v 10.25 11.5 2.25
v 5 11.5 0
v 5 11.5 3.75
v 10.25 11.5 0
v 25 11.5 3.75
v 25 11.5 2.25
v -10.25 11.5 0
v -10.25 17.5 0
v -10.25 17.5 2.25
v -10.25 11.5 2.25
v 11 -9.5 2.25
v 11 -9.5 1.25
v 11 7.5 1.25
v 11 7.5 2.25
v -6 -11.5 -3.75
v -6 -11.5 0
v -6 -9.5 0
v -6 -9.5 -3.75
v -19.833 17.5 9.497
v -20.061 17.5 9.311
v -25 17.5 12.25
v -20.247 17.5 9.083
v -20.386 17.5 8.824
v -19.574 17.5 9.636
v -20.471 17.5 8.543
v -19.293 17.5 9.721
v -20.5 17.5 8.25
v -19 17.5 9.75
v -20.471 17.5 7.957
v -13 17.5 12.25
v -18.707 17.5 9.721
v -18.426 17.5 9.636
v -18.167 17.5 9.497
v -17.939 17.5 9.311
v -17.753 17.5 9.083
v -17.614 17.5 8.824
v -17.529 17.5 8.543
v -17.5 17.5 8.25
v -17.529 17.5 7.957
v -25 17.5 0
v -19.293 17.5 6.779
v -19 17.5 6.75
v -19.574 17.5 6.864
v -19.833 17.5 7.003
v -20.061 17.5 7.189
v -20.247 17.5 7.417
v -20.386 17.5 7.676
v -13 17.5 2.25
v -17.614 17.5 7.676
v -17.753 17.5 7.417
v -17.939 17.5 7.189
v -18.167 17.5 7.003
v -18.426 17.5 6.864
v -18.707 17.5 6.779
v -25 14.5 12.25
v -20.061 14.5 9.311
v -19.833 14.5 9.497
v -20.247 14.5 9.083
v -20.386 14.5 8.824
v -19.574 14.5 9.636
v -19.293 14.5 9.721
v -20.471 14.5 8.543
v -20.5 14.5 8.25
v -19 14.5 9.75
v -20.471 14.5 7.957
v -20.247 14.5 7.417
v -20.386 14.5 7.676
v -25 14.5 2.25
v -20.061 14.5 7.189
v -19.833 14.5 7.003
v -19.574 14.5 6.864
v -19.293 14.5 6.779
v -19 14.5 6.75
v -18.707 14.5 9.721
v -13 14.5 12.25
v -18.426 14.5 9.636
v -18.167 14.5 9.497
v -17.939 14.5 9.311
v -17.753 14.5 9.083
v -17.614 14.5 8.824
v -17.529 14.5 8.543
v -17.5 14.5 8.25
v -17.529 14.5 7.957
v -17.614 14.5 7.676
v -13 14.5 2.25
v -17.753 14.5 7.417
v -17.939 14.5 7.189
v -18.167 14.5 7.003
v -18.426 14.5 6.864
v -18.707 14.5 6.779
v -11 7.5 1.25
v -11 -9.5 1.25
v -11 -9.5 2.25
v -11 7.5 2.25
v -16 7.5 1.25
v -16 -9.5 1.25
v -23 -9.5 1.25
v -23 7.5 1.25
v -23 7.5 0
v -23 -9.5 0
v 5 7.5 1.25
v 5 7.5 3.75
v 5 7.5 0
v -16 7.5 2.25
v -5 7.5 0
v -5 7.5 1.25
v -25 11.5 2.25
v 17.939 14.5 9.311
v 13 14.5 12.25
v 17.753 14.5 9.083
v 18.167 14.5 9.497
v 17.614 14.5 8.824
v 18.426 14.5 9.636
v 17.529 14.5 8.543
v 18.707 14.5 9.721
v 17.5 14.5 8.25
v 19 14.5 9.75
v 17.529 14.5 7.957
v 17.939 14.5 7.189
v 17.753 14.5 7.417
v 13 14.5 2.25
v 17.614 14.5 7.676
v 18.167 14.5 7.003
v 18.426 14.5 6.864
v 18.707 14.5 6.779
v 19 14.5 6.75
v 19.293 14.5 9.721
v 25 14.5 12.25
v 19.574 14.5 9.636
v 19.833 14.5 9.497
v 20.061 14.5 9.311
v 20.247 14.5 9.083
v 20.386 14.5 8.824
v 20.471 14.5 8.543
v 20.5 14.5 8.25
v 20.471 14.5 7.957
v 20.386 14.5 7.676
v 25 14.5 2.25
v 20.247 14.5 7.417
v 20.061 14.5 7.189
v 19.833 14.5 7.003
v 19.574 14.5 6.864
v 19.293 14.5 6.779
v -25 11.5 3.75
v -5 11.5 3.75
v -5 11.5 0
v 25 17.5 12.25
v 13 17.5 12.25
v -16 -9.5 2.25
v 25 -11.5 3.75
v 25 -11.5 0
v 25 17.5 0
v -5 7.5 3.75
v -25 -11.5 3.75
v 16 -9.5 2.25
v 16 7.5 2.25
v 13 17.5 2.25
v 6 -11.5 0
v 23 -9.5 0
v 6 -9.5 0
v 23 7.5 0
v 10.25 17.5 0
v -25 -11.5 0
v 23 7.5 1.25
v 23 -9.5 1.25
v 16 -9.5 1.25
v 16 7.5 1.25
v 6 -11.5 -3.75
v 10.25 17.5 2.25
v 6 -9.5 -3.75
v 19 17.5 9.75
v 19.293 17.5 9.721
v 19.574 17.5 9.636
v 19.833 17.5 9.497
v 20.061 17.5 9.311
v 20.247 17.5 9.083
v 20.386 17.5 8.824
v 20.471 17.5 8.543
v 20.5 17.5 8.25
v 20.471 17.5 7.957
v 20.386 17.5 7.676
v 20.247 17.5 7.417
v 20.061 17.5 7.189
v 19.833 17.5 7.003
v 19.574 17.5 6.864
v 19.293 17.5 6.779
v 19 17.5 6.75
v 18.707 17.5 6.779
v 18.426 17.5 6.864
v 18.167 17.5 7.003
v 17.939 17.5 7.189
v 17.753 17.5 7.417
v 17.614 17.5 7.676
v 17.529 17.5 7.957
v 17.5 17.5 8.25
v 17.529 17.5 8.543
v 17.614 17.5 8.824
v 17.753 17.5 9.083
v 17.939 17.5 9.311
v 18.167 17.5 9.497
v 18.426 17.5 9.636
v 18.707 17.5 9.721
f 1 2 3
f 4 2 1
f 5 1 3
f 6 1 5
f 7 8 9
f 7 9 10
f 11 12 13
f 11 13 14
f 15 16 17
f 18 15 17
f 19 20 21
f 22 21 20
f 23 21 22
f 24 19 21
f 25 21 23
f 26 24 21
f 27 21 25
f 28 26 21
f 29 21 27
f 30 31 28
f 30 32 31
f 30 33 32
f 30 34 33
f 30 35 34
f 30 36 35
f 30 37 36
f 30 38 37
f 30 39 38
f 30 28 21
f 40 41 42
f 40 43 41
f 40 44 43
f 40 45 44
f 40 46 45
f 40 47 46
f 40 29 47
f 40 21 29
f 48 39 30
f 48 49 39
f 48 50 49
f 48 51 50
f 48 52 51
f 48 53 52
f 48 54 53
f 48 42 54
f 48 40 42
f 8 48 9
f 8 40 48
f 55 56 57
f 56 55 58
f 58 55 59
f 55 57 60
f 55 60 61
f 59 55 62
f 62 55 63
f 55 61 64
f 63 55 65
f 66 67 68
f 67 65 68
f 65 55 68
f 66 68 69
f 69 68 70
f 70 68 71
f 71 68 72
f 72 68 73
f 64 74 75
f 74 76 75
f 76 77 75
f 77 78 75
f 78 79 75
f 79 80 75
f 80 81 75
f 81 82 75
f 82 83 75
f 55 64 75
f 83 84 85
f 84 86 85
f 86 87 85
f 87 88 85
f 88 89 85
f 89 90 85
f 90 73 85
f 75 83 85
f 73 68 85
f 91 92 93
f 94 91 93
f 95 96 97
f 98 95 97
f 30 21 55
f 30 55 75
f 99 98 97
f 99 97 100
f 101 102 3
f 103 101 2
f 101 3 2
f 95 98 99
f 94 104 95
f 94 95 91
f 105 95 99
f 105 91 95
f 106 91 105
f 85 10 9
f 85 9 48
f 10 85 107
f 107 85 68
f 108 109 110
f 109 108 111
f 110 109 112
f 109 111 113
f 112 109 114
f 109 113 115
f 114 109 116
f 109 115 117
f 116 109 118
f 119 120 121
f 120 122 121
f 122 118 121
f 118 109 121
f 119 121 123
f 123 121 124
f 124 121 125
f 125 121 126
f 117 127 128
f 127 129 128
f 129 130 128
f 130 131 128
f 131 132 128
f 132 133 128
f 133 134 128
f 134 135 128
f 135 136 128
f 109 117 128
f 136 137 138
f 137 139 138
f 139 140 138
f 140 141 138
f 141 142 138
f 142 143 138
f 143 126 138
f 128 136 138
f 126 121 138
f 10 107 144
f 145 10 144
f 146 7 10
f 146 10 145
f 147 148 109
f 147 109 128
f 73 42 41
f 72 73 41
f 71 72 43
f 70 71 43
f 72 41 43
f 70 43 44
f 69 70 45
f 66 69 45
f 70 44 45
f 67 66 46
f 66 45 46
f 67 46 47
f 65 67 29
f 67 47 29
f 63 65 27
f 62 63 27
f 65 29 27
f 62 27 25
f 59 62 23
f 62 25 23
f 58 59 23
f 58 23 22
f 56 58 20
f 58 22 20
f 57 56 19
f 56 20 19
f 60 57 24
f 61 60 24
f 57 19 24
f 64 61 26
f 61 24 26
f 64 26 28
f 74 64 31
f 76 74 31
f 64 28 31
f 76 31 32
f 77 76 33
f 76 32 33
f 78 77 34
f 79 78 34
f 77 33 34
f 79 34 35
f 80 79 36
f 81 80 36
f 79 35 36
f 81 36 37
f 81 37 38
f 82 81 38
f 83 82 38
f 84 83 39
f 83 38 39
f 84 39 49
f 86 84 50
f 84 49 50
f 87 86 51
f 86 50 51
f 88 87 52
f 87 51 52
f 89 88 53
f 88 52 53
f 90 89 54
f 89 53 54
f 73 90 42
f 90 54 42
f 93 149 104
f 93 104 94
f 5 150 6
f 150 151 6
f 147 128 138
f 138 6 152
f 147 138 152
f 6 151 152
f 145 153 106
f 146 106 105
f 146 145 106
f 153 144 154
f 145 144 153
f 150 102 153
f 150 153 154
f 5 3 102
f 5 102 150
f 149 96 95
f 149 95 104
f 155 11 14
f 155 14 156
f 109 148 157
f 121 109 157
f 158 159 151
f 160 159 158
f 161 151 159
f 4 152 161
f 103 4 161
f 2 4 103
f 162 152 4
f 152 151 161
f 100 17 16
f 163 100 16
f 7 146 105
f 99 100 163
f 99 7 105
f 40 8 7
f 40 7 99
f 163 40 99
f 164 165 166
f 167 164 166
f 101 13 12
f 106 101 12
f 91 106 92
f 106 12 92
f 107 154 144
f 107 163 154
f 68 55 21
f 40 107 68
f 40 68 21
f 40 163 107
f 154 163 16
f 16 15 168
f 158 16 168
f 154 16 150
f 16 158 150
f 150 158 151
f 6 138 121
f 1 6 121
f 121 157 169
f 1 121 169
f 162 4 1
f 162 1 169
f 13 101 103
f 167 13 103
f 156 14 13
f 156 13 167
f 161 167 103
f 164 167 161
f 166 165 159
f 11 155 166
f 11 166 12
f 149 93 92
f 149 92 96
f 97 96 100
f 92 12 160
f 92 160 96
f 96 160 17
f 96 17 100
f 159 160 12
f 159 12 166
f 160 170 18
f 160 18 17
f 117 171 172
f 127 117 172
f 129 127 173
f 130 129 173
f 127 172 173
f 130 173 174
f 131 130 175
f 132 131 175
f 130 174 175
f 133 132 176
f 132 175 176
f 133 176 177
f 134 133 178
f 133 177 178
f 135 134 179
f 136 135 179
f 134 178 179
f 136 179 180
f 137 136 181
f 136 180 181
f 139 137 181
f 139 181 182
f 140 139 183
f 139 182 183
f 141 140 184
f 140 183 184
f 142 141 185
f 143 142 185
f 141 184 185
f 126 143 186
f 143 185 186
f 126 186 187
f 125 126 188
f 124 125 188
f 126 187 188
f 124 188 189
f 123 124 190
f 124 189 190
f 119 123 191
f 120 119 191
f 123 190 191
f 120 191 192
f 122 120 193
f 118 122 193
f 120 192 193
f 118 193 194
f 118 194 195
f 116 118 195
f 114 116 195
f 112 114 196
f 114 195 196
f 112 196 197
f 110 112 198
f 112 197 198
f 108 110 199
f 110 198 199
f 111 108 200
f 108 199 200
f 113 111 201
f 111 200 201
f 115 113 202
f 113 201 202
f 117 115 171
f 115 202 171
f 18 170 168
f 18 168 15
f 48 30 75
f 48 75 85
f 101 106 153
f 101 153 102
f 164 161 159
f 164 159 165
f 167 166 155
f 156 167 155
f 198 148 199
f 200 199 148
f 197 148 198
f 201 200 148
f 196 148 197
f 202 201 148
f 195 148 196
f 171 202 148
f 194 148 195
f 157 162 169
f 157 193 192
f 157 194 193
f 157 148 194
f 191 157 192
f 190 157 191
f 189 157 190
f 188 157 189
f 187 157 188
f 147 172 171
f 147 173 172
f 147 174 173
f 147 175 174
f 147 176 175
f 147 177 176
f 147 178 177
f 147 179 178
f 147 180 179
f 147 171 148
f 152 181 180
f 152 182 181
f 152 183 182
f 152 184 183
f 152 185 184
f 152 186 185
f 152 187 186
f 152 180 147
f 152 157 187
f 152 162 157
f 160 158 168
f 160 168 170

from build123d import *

# Parameters (mm, degrees)
BOSS_EXTRUDE1_DEPTH = 2.25
SKETCH2_W           = 12
SKETCH2_H           = 10
SKETCH2_R           = 1.5
BOSS_EXTRUDE3_DEPTH = 3
SKETCH3_W           = 5
SKETCH3_H           = 1
CUT_EXTRUDE1_DEPTH  = 19
SKETCH4_W           = 50
SKETCH4_H           = 23
BOSS_EXTRUDE5_DEPTH = 1.5
SKETCH5_W           = 10
SKETCH5_H           = 3.75
CUT_EXTRUDE2_DEPTH  = 4
SKETCH7_W           = 12
SKETCH7_H           = 2
BOSS_EXTRUDE6_DEPTH = 5
BOSS_EXTRUDE7_START = -1
SKETCH8_W           = 17
SKETCH8_H           = 2
BOSS_EXTRUDE7_DEPTH = 2.25


with BuildPart() as part:
    # Sketch1 → Boss-Extrude1 (new body)
    with BuildSketch(Plane.XY):
        Polygon((25, -11.5), (-25, -11.5), (-25, 11.5), (-25, 17.5), (-10.25, 17.5), (-10.25, 11.5), (10.25, 11.5), (10.25, 17.5), (25, 17.5), (25, 11.5), align=None)
    extrude(amount=BOSS_EXTRUDE1_DEPTH)

    # Sketch2 → Boss-Extrude3 (add)
    # profile 1 of 2: a face of its own
    with BuildSketch(Plane(origin=(0, 17.5, 0), x_dir=(1, 0, 0), z_dir=(0, 1, 0))):
        with Locations((19, -7.25)):
            Rectangle(SKETCH2_W, SKETCH2_H)
        with Locations(Location((19, -8.25, 0), (0, 0, 270))):
            Circle(SKETCH2_R, mode=Mode.SUBTRACT)
    # profile 2 of 2: a face of its own
    with BuildSketch(Plane(origin=(0, 17.5, 0), x_dir=(1, 0, 0), z_dir=(0, 1, 0))):
        with Locations((-19, -7.25)):
            Rectangle(SKETCH2_W, SKETCH2_H)
        with Locations(Location((-19, -8.25, 0), (0, 0, 90))):
            Circle(SKETCH2_R, mode=Mode.SUBTRACT)
    extrude(amount=-BOSS_EXTRUDE3_DEPTH)

    # Sketch3 → Cut-Extrude1 (cut)
    with BuildSketch(Plane.XZ.offset(11.5)):
        Polygon((-23, 1.25), (-23, 0), (23, 0), (23, 1.25), (16, 1.25), (11, 1.25), (-11, 1.25), (-16, 1.25), align=None)
        with Locations((-13.5, 1.75)):
            Rectangle(SKETCH3_W, SKETCH3_H)
        with Locations((13.5, 1.75)):
            Rectangle(SKETCH3_W, SKETCH3_H)
    extrude(amount=-CUT_EXTRUDE1_DEPTH, mode=Mode.SUBTRACT)

    # Sketch4 → Boss-Extrude5 (add)
    with BuildSketch(Plane.XY.offset(2.25)):
        Rectangle(SKETCH4_W, SKETCH4_H)
    extrude(amount=BOSS_EXTRUDE5_DEPTH)

    # Sketch5 → Cut-Extrude2 (cut)
    with BuildSketch(Plane(origin=(0, 11.5, 0), x_dir=(1, 0, 0), z_dir=(0, 1, 0))):
        with Locations((0, -1.875)):
            Rectangle(SKETCH5_W, SKETCH5_H)
    extrude(amount=-CUT_EXTRUDE2_DEPTH, mode=Mode.SUBTRACT)

    # Sketch7 → Boss-Extrude6 (add)
    with BuildSketch(Plane(origin=(0, 0, 1.25), x_dir=(-1, 0, 0), z_dir=(0, 0, -1))):
        with Locations((0, -10.5)):
            Rectangle(SKETCH7_W, SKETCH7_H)
    extrude(amount=BOSS_EXTRUDE6_DEPTH)

    # Sketch8 → Boss-Extrude7 (add)
    with BuildSketch(Plane(origin=(0, 0, 1.25), x_dir=(-1, 0, 0), z_dir=(0, 0, -1)).offset(BOSS_EXTRUDE7_START)):
        with Locations((14.5, -10.5)):
            Rectangle(SKETCH8_W, SKETCH8_H)
        with Locations((-14.5, -10.5)):
            Rectangle(SKETCH8_W, SKETCH8_H)
    extrude(amount=BOSS_EXTRUDE7_DEPTH)


solid = part.part
